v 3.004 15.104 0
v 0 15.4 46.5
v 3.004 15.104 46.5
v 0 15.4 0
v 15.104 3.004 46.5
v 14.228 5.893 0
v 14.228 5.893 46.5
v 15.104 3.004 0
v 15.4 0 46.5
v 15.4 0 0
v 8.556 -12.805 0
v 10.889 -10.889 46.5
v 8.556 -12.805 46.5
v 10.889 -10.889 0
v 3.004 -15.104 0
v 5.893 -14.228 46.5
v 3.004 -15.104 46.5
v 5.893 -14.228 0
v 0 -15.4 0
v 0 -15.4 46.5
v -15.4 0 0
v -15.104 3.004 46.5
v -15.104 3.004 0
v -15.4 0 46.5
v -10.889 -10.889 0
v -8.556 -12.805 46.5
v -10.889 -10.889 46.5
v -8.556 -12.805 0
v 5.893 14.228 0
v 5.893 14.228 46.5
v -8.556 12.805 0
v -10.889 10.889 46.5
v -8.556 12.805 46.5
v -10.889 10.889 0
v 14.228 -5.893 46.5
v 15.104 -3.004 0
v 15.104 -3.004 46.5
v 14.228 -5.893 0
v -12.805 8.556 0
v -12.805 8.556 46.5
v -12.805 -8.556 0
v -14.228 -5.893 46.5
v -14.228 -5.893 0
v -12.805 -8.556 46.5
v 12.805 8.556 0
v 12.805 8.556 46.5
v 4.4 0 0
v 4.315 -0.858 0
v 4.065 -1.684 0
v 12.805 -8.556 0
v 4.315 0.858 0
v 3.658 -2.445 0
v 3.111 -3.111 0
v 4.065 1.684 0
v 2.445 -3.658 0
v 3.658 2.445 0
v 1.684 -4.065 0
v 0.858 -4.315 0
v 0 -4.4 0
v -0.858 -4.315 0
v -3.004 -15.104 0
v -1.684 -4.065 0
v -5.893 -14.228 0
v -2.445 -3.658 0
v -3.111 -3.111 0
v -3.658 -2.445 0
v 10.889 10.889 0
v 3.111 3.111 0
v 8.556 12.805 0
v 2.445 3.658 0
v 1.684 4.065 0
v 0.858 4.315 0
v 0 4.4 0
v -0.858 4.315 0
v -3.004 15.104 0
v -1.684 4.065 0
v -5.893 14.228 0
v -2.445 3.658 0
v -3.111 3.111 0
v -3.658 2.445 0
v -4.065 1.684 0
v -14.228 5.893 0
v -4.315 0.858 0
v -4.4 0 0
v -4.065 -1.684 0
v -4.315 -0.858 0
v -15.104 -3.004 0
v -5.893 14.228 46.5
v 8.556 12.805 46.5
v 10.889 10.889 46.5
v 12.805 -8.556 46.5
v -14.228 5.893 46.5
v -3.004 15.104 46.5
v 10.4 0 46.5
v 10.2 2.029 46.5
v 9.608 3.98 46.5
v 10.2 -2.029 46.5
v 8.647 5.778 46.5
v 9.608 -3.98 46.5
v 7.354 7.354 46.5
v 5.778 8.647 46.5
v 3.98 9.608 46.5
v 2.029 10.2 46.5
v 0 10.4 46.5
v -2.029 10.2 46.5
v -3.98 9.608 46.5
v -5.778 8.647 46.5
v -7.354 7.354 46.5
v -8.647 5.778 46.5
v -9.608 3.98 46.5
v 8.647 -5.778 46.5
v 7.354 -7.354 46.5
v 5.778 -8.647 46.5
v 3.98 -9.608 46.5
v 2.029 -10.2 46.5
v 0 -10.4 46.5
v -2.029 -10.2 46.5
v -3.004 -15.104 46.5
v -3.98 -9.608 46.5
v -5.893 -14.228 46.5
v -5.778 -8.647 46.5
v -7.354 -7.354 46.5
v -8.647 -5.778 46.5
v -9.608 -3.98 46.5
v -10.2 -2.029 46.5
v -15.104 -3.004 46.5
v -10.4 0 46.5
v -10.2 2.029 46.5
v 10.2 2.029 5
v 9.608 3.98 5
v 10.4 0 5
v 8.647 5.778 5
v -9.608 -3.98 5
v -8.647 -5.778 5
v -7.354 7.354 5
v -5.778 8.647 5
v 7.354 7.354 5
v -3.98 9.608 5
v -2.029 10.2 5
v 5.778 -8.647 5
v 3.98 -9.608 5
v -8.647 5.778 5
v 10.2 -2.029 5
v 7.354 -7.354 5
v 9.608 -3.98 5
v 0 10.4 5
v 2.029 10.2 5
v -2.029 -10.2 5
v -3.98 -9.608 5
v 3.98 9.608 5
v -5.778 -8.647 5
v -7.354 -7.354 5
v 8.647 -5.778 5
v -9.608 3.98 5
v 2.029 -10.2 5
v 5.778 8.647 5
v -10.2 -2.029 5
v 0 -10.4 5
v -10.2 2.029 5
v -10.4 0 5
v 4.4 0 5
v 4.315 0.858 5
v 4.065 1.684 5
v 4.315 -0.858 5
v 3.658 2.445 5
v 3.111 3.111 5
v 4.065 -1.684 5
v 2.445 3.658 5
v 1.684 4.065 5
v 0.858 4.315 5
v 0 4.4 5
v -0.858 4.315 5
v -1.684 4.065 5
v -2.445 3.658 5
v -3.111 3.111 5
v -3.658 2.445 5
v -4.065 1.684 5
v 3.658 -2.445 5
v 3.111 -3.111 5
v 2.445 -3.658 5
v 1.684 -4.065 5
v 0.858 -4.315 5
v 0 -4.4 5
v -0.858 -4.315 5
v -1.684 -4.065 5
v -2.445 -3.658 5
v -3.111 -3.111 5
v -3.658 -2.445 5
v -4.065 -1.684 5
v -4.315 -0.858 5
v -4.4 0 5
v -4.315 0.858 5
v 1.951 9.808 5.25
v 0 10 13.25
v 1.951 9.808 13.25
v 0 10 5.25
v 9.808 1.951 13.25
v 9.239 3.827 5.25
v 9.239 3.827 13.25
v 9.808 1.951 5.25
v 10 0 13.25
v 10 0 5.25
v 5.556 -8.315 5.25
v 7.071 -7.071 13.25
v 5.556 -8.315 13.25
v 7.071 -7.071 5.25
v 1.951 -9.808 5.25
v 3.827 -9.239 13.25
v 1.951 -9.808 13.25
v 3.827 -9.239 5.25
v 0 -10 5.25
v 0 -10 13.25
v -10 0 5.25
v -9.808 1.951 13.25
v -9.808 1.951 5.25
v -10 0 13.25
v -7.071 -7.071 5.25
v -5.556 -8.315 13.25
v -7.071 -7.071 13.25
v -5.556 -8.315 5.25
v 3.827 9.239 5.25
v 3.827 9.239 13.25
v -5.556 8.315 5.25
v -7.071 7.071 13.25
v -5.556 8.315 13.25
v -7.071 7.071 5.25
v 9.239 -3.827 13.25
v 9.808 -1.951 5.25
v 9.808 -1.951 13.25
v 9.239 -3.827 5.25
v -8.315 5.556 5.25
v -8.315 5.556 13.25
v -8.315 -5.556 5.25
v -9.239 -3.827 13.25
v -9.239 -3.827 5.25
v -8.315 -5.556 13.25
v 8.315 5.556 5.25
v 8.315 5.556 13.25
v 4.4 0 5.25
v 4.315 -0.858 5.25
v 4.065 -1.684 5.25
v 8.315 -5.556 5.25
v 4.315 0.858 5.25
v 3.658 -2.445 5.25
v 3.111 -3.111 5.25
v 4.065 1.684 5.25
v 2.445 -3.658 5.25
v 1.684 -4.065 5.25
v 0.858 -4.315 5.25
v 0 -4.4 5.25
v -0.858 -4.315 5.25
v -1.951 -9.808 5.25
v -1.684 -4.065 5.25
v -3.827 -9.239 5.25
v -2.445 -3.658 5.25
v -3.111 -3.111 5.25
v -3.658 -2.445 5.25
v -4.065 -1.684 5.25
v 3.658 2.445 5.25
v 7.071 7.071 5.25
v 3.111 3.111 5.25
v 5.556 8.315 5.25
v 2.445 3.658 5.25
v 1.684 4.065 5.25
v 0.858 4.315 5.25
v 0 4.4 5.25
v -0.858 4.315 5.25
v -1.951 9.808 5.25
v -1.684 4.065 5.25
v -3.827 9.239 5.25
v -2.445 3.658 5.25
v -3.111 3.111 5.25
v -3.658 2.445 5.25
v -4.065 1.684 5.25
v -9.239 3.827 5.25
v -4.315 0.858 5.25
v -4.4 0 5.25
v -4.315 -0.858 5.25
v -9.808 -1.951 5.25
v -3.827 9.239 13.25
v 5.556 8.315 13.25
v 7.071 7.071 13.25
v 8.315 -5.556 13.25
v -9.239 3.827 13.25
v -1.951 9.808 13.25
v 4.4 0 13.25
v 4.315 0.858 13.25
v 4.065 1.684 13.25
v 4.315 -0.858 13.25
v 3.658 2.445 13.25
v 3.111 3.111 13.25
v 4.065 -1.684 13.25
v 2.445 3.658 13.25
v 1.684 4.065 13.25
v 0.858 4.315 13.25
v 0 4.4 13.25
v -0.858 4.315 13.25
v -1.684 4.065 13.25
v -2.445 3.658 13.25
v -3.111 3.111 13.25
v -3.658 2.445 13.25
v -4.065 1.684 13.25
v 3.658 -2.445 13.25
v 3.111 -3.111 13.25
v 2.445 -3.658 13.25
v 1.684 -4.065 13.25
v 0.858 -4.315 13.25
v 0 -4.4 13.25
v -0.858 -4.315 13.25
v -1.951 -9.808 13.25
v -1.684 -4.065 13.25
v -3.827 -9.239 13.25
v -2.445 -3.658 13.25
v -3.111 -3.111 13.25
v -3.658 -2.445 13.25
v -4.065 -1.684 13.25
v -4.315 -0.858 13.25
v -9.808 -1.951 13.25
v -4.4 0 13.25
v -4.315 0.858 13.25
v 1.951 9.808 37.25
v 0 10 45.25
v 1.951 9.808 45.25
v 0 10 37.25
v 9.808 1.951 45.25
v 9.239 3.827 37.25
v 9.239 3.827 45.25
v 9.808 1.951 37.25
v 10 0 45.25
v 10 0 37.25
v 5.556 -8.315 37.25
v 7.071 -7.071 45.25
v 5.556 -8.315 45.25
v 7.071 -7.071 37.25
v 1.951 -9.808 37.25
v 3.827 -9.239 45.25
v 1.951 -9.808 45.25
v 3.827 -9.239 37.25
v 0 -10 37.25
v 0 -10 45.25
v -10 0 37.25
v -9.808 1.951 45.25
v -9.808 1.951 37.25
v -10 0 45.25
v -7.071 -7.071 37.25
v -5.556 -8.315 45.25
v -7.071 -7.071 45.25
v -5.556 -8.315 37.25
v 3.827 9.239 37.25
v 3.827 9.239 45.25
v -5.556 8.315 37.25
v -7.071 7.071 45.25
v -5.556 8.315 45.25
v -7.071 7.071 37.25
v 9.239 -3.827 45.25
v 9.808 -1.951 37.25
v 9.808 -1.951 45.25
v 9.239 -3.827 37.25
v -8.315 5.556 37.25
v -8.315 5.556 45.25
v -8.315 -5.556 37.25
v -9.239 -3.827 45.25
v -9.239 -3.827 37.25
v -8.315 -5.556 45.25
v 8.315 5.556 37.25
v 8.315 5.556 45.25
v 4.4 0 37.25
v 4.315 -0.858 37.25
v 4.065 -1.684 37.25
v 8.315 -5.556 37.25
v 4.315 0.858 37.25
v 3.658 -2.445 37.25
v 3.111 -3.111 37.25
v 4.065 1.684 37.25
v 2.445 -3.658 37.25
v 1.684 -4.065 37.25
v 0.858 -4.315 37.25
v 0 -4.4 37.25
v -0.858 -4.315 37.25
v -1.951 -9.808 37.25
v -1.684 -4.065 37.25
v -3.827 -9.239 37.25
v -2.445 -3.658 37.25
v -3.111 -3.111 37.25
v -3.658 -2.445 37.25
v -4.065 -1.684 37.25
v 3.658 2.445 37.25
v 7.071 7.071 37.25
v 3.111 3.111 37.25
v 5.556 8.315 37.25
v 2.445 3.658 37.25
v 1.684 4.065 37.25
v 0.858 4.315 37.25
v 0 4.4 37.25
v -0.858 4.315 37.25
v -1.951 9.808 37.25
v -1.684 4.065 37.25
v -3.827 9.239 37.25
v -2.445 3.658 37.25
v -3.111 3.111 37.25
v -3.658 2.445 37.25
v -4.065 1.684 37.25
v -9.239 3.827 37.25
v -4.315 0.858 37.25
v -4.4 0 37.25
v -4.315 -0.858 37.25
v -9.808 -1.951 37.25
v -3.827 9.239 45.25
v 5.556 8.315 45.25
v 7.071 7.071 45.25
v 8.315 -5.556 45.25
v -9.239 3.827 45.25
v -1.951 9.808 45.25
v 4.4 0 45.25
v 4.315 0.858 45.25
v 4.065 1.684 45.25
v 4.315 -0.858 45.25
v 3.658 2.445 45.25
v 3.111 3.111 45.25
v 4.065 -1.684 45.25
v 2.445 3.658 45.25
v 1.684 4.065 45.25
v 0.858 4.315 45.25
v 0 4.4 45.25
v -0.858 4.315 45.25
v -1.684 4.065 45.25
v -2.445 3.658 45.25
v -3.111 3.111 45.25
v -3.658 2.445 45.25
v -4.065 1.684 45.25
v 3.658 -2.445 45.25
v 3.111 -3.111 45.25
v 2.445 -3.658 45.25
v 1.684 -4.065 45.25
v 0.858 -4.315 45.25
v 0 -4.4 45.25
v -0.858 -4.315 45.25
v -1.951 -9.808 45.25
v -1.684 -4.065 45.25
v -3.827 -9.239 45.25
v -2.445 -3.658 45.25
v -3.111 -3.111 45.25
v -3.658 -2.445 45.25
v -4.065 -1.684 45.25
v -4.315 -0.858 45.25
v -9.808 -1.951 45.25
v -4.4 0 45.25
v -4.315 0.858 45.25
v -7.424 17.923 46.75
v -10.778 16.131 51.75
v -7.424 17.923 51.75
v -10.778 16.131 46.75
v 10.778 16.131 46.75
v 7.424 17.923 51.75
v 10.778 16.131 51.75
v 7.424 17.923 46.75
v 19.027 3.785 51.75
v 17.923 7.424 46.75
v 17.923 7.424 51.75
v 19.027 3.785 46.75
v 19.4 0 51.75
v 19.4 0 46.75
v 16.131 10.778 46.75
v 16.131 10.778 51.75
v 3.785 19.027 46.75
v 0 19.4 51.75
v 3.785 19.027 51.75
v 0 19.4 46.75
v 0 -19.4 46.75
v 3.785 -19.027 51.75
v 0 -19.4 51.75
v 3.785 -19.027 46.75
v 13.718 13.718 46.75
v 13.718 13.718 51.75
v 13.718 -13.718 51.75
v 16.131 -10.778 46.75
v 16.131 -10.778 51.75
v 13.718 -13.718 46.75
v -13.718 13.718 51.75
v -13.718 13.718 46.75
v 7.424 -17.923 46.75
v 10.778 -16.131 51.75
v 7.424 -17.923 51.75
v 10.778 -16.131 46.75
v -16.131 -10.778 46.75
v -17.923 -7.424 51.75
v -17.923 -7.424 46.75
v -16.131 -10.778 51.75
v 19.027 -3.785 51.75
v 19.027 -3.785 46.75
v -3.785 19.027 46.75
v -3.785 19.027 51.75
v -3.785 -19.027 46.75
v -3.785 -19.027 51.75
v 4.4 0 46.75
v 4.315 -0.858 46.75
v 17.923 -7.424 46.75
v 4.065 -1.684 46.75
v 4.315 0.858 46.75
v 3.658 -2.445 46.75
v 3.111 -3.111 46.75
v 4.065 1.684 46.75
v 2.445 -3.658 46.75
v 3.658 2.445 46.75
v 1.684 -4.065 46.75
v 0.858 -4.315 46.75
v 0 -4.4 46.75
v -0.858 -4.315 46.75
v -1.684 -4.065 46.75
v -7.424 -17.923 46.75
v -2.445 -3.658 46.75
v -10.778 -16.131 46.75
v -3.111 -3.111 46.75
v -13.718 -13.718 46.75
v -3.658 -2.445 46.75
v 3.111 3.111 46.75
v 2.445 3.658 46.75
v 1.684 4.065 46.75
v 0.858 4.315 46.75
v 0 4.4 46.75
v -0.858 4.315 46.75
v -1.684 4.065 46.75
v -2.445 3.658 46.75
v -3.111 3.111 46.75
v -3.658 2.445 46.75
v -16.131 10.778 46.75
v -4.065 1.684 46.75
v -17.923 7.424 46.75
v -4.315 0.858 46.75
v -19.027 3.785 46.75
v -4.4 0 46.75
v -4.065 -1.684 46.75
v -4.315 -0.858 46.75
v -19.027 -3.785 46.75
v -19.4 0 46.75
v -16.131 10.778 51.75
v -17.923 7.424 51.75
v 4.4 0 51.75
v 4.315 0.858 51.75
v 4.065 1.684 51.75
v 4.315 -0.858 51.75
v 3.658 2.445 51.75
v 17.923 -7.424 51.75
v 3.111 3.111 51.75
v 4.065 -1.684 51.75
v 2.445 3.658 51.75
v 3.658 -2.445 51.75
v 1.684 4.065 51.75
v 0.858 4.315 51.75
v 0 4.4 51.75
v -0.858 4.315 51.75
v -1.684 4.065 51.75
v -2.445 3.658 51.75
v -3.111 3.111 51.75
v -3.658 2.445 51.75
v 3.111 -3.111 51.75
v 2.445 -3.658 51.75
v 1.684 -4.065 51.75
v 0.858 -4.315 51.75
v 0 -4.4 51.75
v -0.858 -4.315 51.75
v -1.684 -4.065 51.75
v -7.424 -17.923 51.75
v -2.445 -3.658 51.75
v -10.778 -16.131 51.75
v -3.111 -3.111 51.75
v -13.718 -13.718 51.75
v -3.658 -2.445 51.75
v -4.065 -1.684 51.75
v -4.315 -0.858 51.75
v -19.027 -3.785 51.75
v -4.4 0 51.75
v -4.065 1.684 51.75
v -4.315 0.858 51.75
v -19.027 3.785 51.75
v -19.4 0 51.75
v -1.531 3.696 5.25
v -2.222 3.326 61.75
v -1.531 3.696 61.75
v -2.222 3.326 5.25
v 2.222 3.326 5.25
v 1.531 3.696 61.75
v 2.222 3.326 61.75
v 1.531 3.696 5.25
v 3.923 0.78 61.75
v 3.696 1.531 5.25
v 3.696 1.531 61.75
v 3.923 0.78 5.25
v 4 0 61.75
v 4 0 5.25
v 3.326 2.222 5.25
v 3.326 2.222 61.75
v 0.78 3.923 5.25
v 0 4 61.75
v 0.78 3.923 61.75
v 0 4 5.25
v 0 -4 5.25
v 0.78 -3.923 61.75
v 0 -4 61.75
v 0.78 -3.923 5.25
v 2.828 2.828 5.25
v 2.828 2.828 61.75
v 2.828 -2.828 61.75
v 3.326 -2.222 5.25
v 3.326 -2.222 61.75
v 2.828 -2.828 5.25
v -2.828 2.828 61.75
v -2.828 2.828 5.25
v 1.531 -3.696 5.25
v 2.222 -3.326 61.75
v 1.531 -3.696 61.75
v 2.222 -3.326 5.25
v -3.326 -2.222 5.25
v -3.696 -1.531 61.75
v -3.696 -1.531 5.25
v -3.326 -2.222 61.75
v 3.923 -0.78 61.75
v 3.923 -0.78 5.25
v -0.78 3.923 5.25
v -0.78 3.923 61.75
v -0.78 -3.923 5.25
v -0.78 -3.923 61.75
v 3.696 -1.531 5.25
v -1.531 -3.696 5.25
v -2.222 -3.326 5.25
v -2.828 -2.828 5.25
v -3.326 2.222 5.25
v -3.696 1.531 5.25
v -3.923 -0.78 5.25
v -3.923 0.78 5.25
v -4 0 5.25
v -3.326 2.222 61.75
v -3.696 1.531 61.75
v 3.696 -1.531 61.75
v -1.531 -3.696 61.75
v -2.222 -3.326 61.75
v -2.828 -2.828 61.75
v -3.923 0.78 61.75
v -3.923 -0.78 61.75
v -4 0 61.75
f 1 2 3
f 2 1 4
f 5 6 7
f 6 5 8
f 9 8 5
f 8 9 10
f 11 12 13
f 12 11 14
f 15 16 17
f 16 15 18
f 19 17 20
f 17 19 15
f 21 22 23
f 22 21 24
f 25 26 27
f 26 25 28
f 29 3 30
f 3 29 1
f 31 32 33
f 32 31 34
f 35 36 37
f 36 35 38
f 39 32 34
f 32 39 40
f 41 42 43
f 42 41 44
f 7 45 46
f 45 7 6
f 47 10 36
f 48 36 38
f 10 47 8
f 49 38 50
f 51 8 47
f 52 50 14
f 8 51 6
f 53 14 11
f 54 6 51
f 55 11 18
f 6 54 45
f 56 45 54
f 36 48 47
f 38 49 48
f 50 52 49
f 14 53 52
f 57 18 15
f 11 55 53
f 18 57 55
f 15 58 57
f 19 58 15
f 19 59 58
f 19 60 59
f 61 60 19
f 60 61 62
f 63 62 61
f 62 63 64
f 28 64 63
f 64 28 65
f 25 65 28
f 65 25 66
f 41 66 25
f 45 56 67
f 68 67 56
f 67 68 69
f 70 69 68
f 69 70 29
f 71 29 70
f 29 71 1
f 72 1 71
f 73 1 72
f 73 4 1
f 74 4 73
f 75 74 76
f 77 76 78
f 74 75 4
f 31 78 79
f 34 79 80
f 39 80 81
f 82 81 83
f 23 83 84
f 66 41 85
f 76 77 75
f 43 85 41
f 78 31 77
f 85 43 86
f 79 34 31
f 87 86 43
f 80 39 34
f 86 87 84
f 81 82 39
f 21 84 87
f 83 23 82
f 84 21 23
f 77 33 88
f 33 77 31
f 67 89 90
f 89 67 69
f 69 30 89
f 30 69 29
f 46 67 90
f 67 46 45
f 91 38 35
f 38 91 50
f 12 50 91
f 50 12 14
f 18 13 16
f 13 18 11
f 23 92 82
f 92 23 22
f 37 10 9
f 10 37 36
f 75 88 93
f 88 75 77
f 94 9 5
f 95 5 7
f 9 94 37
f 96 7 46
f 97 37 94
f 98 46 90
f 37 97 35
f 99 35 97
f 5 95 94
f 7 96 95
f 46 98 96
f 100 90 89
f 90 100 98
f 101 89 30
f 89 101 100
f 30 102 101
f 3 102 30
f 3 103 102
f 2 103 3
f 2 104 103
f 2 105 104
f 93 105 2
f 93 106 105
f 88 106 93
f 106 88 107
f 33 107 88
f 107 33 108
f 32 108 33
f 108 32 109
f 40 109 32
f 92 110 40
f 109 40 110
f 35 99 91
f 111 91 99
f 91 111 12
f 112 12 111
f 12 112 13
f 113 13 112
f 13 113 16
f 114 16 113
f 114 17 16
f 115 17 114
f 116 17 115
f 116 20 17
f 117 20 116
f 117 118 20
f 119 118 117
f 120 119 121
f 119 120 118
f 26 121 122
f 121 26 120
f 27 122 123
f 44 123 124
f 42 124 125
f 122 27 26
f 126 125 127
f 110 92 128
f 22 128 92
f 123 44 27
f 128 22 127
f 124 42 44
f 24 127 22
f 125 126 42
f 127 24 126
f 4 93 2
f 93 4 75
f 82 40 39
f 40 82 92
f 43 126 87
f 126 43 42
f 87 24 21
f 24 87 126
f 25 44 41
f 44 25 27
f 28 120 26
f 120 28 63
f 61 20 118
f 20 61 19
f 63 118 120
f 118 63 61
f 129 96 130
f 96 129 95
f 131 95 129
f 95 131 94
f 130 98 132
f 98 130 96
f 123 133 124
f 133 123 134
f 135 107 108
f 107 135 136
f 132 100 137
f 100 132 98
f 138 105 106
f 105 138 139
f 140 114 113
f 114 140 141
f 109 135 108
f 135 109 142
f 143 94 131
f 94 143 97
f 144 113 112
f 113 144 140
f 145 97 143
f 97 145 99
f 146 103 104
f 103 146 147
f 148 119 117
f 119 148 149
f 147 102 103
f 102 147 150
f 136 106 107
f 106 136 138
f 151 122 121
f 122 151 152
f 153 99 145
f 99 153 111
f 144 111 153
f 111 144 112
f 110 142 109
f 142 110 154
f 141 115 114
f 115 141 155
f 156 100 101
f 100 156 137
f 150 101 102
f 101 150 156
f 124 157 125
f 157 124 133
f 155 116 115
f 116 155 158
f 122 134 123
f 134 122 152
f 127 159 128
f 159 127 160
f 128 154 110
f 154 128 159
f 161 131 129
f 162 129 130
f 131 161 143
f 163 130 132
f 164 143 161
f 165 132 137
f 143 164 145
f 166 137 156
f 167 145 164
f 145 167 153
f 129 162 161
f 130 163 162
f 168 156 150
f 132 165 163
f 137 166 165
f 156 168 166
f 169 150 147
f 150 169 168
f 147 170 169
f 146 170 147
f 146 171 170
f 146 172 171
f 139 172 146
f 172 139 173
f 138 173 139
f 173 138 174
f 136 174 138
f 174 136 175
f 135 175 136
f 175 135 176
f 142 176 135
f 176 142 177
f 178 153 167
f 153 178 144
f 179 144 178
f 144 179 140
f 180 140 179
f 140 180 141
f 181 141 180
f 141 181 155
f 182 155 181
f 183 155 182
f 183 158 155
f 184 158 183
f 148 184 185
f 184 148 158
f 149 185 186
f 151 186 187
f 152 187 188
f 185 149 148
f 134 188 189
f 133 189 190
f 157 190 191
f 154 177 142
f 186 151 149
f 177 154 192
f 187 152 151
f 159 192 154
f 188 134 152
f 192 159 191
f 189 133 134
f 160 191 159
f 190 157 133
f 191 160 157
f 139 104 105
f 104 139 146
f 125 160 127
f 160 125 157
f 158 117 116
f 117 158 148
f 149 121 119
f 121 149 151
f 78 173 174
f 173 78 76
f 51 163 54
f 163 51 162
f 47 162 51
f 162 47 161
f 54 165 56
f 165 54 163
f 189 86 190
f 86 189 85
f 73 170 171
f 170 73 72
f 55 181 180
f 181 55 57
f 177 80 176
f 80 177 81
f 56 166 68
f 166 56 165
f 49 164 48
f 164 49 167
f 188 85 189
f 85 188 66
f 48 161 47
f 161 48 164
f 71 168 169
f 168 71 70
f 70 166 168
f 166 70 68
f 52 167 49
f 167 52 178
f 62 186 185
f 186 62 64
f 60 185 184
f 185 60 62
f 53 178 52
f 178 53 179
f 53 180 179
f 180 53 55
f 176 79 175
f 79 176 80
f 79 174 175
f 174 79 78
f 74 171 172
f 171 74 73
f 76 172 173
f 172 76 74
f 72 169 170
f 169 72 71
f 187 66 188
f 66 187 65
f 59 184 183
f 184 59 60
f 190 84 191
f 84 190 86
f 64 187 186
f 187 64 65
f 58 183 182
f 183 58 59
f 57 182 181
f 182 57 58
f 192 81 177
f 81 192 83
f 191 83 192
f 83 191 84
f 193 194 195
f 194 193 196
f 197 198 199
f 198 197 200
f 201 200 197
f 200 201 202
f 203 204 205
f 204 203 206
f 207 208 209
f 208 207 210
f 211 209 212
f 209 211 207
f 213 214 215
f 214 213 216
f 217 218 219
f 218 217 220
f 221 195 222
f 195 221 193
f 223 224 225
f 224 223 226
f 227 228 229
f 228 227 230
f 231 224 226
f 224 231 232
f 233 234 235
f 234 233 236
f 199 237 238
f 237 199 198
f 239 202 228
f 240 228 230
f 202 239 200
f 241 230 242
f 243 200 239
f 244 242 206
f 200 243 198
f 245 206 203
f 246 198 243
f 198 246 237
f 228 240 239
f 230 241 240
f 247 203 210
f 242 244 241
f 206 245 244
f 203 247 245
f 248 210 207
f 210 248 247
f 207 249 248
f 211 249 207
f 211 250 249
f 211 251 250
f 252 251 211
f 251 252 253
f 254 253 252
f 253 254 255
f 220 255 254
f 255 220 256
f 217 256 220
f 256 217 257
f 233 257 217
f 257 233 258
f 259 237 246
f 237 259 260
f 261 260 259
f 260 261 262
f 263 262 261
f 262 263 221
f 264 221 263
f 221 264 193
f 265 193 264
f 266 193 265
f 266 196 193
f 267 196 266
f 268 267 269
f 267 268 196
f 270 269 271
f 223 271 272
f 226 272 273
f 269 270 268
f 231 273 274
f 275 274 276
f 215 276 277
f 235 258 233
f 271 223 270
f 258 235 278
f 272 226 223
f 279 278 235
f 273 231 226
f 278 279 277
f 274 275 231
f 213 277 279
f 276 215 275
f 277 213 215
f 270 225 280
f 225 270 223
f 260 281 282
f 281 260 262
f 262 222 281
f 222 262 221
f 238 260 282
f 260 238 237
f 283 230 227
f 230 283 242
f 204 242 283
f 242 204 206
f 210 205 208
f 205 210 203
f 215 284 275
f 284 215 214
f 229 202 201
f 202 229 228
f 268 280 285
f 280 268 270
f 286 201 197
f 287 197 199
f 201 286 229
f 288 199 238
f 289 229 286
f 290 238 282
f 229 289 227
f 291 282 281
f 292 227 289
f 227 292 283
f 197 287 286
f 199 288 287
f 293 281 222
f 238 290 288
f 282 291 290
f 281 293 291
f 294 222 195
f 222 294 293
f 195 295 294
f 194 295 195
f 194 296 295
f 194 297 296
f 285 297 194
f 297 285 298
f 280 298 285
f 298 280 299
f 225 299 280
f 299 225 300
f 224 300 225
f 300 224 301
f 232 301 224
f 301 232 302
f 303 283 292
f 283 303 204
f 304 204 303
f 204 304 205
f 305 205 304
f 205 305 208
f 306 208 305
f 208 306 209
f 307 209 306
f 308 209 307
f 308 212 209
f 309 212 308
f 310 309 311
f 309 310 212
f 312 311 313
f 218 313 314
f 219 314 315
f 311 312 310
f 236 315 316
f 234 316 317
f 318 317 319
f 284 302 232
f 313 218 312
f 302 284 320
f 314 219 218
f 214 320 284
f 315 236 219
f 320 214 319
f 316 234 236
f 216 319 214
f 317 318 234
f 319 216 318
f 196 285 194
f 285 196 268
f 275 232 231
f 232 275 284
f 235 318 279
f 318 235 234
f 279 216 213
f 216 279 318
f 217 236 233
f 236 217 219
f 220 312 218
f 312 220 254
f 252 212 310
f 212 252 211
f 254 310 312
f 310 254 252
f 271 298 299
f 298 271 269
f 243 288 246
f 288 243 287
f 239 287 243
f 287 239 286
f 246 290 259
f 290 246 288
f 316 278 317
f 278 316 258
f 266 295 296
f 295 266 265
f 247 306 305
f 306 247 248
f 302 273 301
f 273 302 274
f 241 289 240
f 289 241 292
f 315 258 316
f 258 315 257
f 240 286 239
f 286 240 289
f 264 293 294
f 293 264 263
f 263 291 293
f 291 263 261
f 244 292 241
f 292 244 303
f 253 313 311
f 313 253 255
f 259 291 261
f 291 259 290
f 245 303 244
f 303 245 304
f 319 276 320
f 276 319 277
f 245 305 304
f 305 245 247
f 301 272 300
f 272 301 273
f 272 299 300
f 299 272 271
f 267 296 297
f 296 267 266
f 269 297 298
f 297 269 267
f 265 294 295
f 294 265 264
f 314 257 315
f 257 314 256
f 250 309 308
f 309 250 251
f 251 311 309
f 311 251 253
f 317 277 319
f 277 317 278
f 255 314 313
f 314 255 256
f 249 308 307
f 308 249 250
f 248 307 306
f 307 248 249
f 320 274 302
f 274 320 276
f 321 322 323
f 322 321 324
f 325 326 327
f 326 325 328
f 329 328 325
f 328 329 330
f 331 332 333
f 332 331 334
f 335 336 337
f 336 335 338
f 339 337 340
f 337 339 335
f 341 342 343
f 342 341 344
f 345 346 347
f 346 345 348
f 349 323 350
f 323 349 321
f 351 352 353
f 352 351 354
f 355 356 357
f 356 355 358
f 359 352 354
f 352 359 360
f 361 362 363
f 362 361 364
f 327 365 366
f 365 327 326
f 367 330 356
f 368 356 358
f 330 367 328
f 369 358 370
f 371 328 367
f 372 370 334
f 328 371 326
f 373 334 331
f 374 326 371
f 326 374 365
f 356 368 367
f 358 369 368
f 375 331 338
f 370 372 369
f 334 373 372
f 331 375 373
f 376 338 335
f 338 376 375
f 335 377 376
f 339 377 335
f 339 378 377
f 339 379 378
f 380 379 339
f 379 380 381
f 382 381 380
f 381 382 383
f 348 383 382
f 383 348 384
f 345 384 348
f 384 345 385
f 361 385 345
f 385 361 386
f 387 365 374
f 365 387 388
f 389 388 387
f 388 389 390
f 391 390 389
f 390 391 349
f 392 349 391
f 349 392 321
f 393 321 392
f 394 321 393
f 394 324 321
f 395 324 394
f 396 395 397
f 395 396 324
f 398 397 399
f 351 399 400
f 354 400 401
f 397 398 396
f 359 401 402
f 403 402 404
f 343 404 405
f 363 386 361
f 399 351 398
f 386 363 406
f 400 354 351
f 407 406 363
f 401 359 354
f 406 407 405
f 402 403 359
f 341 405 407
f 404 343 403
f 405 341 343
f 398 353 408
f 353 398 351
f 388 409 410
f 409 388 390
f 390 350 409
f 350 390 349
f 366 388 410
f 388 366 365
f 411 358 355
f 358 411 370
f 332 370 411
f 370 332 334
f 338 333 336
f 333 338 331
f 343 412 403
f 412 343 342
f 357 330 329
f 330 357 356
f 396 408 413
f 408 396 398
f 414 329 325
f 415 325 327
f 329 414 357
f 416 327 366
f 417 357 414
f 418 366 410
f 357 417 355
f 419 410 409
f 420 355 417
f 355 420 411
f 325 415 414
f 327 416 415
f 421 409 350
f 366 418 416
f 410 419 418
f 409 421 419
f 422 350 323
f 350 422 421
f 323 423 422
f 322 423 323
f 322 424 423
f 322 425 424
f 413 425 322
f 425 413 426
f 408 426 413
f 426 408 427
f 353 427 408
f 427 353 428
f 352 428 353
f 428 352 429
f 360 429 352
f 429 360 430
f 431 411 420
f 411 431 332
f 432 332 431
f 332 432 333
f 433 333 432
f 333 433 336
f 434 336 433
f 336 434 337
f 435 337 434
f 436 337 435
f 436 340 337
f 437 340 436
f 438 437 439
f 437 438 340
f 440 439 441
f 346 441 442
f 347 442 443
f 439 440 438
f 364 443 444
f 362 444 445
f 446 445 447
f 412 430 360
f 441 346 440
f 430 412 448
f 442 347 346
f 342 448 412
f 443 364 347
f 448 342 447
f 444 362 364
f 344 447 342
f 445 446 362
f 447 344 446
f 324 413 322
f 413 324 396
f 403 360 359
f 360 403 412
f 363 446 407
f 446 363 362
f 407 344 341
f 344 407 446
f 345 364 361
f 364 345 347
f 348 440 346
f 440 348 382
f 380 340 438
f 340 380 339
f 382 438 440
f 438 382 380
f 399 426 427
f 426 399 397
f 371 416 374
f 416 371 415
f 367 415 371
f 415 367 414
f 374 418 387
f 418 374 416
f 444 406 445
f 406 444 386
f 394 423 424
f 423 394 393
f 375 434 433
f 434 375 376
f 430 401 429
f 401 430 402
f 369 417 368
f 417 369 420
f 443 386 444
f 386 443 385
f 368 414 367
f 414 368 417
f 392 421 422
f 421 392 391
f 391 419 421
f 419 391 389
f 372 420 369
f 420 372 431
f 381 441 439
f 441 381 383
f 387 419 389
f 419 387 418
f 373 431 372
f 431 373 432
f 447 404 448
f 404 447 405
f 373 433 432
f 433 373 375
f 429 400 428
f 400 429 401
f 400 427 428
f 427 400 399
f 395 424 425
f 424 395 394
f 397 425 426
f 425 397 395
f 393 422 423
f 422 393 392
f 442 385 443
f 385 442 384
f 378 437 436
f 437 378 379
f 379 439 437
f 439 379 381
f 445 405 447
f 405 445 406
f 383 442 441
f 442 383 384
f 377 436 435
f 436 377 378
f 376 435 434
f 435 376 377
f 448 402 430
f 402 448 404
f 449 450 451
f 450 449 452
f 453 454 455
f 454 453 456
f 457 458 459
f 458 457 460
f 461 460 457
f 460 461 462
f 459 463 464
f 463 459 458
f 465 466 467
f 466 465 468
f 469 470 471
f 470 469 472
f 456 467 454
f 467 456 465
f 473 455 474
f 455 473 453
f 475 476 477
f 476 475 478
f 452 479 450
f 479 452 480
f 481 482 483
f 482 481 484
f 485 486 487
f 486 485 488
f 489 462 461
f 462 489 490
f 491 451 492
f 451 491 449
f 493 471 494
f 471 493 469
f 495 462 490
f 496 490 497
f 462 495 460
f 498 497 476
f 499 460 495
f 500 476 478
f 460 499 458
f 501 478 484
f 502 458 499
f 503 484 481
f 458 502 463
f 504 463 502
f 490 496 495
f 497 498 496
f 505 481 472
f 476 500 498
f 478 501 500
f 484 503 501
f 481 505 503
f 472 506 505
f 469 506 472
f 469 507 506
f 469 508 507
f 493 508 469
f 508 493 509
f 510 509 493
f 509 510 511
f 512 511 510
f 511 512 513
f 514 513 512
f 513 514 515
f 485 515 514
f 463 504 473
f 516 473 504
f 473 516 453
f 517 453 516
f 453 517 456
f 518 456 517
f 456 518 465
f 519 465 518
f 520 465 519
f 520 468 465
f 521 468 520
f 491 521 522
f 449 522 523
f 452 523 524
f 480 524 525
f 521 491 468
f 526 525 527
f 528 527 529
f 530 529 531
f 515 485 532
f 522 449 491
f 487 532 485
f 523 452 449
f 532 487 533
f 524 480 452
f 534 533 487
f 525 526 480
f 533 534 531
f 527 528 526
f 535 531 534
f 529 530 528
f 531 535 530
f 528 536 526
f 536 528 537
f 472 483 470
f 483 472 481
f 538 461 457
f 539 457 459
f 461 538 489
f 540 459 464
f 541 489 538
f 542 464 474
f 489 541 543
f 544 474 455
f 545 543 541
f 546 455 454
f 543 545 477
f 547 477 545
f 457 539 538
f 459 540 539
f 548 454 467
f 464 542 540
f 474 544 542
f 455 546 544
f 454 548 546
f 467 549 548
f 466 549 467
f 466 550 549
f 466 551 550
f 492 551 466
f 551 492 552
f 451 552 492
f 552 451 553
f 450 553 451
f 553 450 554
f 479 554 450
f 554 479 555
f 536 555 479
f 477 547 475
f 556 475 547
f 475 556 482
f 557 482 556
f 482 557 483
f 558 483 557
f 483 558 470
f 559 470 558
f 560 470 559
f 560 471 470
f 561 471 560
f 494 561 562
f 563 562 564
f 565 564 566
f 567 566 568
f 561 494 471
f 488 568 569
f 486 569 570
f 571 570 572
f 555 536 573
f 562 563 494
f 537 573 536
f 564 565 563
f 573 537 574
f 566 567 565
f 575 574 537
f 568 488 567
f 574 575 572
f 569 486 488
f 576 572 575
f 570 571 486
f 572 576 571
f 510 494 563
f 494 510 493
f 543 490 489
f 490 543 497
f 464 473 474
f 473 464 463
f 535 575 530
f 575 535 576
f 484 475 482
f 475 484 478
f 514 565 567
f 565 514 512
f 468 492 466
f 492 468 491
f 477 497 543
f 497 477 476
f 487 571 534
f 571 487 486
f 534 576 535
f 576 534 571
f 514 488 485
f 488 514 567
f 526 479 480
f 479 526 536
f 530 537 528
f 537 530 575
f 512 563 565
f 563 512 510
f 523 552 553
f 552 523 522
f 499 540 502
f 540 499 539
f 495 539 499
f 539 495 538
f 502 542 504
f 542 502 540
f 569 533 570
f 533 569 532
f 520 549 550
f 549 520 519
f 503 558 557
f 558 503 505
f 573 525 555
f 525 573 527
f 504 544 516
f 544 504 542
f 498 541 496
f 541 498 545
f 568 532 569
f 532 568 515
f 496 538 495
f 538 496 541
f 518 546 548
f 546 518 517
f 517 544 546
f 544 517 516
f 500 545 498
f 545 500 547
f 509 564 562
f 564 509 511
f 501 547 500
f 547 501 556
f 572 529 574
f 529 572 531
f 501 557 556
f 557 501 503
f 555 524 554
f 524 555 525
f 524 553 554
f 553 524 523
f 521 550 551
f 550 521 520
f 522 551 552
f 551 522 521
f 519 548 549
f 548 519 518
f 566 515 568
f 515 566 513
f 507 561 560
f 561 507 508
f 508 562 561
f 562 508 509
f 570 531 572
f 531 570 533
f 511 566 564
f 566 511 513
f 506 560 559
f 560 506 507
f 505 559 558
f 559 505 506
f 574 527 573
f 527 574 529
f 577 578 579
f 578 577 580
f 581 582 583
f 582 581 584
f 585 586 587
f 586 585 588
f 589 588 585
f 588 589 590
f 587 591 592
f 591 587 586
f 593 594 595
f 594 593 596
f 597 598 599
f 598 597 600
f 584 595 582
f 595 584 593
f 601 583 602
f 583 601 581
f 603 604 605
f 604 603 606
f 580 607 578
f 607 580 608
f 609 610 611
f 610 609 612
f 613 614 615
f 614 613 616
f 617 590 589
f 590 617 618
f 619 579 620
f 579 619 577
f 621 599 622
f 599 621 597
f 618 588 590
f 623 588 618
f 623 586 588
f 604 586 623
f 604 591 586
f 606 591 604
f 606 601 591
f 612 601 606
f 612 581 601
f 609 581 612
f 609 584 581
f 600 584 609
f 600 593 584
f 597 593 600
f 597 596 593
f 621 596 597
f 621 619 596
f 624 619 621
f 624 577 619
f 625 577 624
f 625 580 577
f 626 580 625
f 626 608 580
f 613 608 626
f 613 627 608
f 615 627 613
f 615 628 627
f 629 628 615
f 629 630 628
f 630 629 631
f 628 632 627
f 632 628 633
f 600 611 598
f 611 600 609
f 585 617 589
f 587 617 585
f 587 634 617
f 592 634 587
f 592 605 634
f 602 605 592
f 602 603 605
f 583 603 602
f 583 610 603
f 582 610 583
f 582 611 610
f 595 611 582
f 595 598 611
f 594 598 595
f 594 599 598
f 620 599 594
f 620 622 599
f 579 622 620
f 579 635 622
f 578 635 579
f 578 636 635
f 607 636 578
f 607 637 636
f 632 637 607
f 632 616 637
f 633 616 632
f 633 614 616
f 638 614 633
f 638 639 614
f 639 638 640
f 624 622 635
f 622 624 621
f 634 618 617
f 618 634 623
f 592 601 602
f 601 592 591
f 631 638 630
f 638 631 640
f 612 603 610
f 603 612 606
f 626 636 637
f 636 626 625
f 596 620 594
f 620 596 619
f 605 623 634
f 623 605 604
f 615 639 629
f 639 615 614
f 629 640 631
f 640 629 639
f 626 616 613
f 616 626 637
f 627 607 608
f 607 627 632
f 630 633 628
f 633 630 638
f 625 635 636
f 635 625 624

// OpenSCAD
$fn = 32;

// ------------------------------------------------------------------------
// Shaft station: cup d30.8 x 46.5 mm, shaft d8
// Every part is its own module, assembly() places every instance.
// ------------------------------------------------------------------------

// --- part 1 ---
module housing_cup() {
  difference() {
    cylinder(h = 46.5, d = 30.8);
    translate([0, 0, 5]) cylinder(h = 42.5, d = 20.8);
    translate([0, 0, -1]) cylinder(h = 7, d = 8.8);
  }
}

// --- part 2 ---
module bearing_lower() {
  difference() {
      translate([0, 0, 0]) cylinder(h = 8, d = 20);
      translate([0, 0, -1]) cylinder(h = 10, d = 8.8);
    }
}

// --- part 3 ---
module bearing_upper() {
  difference() {
      translate([0, 0, 0]) cylinder(h = 8, d = 20);
      translate([0, 0, -1]) cylinder(h = 10, d = 8.8);
    }
}

// --- part 4 ---
module station_shaft() {
  translate([0, 0, -28.25]) cylinder(h = 56.5, d = 8);
}

// --- part 5 ---
module station_cover() {
  difference() {
    cylinder(h = 5, d = 38.8);
    translate([0, 0, -1]) cylinder(h = 7, d = 8.8);
  }
}

// --- assembly ---
module assembly() {
  color([0.80, 0.24, 0.20]) translate([0, 0, 0]) rotate([0, 0, 0]) housing_cup();
  color([0.20, 0.45, 0.75]) translate([0, 0, 5.25]) rotate([0, 0, 0]) bearing_lower();
  color([0.25, 0.62, 0.32]) translate([0, 0, 37.25]) rotate([0, 0, 0]) bearing_upper();
  color([0.92, 0.70, 0.18]) translate([0, 0, 33.5]) rotate([0, 0, 0]) station_shaft();
  color([0.58, 0.35, 0.70]) translate([0, 0, 46.75]) rotate([0, 0, 0]) station_cover();
}

assembly();
